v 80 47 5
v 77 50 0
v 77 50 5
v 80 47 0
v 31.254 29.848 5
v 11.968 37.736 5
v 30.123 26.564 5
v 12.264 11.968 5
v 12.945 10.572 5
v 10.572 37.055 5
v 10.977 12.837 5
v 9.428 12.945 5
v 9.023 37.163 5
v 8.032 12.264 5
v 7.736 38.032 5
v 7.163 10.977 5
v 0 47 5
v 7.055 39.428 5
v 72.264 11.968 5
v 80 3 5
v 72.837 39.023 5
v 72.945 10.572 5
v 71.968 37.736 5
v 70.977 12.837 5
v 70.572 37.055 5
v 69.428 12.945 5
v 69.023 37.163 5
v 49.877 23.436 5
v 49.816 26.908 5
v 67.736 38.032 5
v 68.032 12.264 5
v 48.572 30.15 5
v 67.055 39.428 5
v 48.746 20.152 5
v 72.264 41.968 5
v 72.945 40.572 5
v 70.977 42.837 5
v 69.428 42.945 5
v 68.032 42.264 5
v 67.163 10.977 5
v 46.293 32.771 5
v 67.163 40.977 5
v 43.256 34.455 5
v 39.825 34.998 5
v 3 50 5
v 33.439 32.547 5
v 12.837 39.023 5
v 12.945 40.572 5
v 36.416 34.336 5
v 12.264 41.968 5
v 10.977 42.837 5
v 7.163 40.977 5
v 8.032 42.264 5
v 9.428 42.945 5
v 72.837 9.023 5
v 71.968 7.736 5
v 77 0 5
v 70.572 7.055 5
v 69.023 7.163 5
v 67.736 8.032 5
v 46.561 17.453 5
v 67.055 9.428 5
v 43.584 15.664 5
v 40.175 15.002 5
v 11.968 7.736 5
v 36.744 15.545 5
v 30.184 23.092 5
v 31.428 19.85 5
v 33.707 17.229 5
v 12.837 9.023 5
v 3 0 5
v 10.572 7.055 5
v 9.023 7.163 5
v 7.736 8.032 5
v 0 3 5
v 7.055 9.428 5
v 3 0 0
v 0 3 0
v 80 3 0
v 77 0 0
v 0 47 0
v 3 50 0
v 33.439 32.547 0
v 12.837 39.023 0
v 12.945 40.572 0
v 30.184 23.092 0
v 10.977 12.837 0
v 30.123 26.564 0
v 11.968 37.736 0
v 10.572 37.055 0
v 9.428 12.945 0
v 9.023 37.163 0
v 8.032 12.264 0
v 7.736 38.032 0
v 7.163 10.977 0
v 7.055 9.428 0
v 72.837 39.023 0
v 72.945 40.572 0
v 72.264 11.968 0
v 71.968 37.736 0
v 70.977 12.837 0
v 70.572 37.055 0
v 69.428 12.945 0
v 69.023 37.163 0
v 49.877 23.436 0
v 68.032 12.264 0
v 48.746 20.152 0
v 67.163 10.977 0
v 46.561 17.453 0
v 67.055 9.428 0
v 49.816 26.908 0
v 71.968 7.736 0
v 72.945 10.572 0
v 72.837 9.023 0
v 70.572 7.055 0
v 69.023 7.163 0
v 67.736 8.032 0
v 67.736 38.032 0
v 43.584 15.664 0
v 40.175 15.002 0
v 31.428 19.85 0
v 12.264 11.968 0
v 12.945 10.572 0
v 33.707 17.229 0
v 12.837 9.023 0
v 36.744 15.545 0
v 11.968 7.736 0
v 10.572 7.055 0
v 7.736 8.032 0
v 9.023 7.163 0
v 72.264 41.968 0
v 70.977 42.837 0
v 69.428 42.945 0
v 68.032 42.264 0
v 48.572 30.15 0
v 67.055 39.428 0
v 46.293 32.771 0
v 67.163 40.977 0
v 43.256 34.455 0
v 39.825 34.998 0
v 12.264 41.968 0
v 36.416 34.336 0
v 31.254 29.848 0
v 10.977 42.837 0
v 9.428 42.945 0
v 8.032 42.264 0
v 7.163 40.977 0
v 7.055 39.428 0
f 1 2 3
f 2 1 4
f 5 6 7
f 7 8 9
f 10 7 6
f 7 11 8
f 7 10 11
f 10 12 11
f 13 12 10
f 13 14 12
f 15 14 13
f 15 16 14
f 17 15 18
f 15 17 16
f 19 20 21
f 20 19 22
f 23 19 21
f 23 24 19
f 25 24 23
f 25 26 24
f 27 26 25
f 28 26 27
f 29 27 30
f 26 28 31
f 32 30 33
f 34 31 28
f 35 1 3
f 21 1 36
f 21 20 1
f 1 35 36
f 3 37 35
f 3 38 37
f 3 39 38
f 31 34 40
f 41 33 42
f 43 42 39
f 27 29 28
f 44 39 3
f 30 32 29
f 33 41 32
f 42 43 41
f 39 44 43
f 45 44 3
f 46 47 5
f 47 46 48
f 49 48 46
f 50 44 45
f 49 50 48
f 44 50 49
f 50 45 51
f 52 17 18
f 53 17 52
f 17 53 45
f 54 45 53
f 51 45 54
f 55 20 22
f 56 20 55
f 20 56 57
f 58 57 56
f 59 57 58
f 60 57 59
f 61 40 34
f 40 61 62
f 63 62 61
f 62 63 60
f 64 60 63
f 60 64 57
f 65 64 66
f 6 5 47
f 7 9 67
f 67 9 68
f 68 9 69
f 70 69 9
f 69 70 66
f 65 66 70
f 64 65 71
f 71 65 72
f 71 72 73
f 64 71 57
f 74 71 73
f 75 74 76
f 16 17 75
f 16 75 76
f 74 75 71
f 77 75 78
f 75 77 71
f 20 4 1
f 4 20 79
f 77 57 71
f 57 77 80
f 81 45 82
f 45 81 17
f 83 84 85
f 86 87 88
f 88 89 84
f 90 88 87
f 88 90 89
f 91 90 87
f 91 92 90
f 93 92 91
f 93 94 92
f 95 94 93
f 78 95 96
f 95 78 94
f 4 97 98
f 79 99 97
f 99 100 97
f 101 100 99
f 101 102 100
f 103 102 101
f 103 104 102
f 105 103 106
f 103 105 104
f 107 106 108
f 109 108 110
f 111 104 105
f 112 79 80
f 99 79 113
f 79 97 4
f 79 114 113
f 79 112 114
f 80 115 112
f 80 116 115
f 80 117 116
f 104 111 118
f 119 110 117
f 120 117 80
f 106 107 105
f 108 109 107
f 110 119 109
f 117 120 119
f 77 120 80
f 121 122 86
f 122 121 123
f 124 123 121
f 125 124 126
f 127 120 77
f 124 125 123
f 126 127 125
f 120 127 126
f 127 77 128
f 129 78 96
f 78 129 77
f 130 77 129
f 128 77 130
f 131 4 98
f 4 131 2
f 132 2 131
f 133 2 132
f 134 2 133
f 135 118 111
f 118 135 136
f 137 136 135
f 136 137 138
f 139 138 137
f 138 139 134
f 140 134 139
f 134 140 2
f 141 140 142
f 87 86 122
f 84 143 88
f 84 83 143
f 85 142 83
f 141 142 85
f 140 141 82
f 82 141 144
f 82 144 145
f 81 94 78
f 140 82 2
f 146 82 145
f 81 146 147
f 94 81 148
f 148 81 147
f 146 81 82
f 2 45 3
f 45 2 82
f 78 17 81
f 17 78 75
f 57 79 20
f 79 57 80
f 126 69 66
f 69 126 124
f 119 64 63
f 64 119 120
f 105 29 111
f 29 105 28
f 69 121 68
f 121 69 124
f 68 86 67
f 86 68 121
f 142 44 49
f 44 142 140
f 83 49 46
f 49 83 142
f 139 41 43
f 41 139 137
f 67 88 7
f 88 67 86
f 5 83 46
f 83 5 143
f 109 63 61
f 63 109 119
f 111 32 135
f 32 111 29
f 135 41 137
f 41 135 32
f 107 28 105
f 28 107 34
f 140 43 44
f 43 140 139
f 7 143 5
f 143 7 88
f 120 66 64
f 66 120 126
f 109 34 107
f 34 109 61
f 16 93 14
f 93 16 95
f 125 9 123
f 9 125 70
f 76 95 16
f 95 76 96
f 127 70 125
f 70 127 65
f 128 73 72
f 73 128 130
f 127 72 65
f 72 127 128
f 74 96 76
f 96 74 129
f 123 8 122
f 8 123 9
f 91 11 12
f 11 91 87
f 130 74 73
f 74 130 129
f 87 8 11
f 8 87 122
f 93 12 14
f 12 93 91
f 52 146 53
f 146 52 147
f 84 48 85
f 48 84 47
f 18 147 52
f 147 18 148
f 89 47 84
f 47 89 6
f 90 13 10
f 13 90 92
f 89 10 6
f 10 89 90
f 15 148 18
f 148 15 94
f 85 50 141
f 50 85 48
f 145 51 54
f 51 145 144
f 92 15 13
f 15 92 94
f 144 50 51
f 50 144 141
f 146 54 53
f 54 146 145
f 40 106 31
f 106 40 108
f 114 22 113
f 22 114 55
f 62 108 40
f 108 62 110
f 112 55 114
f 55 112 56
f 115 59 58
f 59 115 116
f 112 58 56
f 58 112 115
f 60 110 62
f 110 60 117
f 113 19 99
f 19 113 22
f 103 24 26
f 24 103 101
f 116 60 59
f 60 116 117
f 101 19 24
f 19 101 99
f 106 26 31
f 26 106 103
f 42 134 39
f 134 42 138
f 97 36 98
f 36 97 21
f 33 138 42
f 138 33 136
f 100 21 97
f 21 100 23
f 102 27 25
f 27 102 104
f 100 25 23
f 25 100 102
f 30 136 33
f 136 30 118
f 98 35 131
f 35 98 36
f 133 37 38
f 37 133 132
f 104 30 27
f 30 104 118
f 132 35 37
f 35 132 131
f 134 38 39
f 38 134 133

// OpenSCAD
$fn = 32;

// ----------------------------------------------------------------------
// Spacer plate: rect 80 x 50
// ----------------------------------------------------------------------

// --- parameters (mm) ---
bore_r = 10;              // centre bore radius
bolt_r = 3;               // bolt hole radius
plate_t = 5;              // plate thickness, Z (extrusion height)
plate_l = 80;             // plate length, X
plate_w = 50;             // plate width, Y
inset = 10;               // corner hole inset
fit_tol = 0.02;           // declared fit tolerance (prompt contract)
free_tol = 0.2;           // declared free tolerance (prompt contract)

profile = [[3, 0], [77, 0], [80, 3], [80, 47], [77, 50], [3, 50], [0, 47], [0, 3]];  // primary outline, 8 points, counter clockwise
void_1 = [[49.816, 26.908], [48.572, 30.15], [46.293, 32.771], [43.256, 34.455], [39.825, 34.998], [36.416, 34.336], [33.439, 32.547], [31.254, 29.848], [30.123, 26.564], [30.184, 23.092], [31.428, 19.85], [33.707, 17.229], [36.744, 15.545], [40.175, 15.002], [43.584, 15.664], [46.561, 17.453], [48.746, 20.152], [49.877, 23.436]];  // centre bore, 18 points
void_2 = [[12.945, 10.572], [12.264, 11.968], [10.977, 12.837], [9.428, 12.945], [8.032, 12.264], [7.163, 10.977], [7.055, 9.428], [7.736, 8.032], [9.023, 7.163], [10.572, 7.055], [11.968, 7.736], [12.837, 9.023]];  // corner hole, 12 points
void_3 = [[12.945, 40.572], [12.264, 41.968], [10.977, 42.837], [9.428, 42.945], [8.032, 42.264], [7.163, 40.977], [7.055, 39.428], [7.736, 38.032], [9.023, 37.163], [10.572, 37.055], [11.968, 37.736], [12.837, 39.023]];  // corner hole, 12 points
void_4 = [[72.945, 10.572], [72.264, 11.968], [70.977, 12.837], [69.428, 12.945], [68.032, 12.264], [67.163, 10.977], [67.055, 9.428], [67.736, 8.032], [69.023, 7.163], [70.572, 7.055], [71.968, 7.736], [72.837, 9.023]];  // corner hole, 12 points
void_5 = [[72.945, 40.572], [72.264, 41.968], [70.977, 42.837], [69.428, 42.945], [68.032, 42.264], [67.163, 40.977], [67.055, 39.428], [67.736, 38.032], [69.023, 37.163], [70.572, 37.055], [71.968, 37.736], [72.837, 39.023]];  // corner hole, 12 points

// --- the one profile operation ---
difference() {
  linear_extrude(height = plate_t) polygon(points = profile);
  translate([0, 0, -1])
    linear_extrude(height = plate_t + 2) polygon(points = void_1);
  translate([0, 0, -1])
    linear_extrude(height = plate_t + 2) polygon(points = void_2);
  translate([0, 0, -1])
    linear_extrude(height = plate_t + 2) polygon(points = void_3);
  translate([0, 0, -1])
    linear_extrude(height = plate_t + 2) polygon(points = void_4);
  translate([0, 0, -1])
    linear_extrude(height = plate_t + 2) polygon(points = void_5);
}
